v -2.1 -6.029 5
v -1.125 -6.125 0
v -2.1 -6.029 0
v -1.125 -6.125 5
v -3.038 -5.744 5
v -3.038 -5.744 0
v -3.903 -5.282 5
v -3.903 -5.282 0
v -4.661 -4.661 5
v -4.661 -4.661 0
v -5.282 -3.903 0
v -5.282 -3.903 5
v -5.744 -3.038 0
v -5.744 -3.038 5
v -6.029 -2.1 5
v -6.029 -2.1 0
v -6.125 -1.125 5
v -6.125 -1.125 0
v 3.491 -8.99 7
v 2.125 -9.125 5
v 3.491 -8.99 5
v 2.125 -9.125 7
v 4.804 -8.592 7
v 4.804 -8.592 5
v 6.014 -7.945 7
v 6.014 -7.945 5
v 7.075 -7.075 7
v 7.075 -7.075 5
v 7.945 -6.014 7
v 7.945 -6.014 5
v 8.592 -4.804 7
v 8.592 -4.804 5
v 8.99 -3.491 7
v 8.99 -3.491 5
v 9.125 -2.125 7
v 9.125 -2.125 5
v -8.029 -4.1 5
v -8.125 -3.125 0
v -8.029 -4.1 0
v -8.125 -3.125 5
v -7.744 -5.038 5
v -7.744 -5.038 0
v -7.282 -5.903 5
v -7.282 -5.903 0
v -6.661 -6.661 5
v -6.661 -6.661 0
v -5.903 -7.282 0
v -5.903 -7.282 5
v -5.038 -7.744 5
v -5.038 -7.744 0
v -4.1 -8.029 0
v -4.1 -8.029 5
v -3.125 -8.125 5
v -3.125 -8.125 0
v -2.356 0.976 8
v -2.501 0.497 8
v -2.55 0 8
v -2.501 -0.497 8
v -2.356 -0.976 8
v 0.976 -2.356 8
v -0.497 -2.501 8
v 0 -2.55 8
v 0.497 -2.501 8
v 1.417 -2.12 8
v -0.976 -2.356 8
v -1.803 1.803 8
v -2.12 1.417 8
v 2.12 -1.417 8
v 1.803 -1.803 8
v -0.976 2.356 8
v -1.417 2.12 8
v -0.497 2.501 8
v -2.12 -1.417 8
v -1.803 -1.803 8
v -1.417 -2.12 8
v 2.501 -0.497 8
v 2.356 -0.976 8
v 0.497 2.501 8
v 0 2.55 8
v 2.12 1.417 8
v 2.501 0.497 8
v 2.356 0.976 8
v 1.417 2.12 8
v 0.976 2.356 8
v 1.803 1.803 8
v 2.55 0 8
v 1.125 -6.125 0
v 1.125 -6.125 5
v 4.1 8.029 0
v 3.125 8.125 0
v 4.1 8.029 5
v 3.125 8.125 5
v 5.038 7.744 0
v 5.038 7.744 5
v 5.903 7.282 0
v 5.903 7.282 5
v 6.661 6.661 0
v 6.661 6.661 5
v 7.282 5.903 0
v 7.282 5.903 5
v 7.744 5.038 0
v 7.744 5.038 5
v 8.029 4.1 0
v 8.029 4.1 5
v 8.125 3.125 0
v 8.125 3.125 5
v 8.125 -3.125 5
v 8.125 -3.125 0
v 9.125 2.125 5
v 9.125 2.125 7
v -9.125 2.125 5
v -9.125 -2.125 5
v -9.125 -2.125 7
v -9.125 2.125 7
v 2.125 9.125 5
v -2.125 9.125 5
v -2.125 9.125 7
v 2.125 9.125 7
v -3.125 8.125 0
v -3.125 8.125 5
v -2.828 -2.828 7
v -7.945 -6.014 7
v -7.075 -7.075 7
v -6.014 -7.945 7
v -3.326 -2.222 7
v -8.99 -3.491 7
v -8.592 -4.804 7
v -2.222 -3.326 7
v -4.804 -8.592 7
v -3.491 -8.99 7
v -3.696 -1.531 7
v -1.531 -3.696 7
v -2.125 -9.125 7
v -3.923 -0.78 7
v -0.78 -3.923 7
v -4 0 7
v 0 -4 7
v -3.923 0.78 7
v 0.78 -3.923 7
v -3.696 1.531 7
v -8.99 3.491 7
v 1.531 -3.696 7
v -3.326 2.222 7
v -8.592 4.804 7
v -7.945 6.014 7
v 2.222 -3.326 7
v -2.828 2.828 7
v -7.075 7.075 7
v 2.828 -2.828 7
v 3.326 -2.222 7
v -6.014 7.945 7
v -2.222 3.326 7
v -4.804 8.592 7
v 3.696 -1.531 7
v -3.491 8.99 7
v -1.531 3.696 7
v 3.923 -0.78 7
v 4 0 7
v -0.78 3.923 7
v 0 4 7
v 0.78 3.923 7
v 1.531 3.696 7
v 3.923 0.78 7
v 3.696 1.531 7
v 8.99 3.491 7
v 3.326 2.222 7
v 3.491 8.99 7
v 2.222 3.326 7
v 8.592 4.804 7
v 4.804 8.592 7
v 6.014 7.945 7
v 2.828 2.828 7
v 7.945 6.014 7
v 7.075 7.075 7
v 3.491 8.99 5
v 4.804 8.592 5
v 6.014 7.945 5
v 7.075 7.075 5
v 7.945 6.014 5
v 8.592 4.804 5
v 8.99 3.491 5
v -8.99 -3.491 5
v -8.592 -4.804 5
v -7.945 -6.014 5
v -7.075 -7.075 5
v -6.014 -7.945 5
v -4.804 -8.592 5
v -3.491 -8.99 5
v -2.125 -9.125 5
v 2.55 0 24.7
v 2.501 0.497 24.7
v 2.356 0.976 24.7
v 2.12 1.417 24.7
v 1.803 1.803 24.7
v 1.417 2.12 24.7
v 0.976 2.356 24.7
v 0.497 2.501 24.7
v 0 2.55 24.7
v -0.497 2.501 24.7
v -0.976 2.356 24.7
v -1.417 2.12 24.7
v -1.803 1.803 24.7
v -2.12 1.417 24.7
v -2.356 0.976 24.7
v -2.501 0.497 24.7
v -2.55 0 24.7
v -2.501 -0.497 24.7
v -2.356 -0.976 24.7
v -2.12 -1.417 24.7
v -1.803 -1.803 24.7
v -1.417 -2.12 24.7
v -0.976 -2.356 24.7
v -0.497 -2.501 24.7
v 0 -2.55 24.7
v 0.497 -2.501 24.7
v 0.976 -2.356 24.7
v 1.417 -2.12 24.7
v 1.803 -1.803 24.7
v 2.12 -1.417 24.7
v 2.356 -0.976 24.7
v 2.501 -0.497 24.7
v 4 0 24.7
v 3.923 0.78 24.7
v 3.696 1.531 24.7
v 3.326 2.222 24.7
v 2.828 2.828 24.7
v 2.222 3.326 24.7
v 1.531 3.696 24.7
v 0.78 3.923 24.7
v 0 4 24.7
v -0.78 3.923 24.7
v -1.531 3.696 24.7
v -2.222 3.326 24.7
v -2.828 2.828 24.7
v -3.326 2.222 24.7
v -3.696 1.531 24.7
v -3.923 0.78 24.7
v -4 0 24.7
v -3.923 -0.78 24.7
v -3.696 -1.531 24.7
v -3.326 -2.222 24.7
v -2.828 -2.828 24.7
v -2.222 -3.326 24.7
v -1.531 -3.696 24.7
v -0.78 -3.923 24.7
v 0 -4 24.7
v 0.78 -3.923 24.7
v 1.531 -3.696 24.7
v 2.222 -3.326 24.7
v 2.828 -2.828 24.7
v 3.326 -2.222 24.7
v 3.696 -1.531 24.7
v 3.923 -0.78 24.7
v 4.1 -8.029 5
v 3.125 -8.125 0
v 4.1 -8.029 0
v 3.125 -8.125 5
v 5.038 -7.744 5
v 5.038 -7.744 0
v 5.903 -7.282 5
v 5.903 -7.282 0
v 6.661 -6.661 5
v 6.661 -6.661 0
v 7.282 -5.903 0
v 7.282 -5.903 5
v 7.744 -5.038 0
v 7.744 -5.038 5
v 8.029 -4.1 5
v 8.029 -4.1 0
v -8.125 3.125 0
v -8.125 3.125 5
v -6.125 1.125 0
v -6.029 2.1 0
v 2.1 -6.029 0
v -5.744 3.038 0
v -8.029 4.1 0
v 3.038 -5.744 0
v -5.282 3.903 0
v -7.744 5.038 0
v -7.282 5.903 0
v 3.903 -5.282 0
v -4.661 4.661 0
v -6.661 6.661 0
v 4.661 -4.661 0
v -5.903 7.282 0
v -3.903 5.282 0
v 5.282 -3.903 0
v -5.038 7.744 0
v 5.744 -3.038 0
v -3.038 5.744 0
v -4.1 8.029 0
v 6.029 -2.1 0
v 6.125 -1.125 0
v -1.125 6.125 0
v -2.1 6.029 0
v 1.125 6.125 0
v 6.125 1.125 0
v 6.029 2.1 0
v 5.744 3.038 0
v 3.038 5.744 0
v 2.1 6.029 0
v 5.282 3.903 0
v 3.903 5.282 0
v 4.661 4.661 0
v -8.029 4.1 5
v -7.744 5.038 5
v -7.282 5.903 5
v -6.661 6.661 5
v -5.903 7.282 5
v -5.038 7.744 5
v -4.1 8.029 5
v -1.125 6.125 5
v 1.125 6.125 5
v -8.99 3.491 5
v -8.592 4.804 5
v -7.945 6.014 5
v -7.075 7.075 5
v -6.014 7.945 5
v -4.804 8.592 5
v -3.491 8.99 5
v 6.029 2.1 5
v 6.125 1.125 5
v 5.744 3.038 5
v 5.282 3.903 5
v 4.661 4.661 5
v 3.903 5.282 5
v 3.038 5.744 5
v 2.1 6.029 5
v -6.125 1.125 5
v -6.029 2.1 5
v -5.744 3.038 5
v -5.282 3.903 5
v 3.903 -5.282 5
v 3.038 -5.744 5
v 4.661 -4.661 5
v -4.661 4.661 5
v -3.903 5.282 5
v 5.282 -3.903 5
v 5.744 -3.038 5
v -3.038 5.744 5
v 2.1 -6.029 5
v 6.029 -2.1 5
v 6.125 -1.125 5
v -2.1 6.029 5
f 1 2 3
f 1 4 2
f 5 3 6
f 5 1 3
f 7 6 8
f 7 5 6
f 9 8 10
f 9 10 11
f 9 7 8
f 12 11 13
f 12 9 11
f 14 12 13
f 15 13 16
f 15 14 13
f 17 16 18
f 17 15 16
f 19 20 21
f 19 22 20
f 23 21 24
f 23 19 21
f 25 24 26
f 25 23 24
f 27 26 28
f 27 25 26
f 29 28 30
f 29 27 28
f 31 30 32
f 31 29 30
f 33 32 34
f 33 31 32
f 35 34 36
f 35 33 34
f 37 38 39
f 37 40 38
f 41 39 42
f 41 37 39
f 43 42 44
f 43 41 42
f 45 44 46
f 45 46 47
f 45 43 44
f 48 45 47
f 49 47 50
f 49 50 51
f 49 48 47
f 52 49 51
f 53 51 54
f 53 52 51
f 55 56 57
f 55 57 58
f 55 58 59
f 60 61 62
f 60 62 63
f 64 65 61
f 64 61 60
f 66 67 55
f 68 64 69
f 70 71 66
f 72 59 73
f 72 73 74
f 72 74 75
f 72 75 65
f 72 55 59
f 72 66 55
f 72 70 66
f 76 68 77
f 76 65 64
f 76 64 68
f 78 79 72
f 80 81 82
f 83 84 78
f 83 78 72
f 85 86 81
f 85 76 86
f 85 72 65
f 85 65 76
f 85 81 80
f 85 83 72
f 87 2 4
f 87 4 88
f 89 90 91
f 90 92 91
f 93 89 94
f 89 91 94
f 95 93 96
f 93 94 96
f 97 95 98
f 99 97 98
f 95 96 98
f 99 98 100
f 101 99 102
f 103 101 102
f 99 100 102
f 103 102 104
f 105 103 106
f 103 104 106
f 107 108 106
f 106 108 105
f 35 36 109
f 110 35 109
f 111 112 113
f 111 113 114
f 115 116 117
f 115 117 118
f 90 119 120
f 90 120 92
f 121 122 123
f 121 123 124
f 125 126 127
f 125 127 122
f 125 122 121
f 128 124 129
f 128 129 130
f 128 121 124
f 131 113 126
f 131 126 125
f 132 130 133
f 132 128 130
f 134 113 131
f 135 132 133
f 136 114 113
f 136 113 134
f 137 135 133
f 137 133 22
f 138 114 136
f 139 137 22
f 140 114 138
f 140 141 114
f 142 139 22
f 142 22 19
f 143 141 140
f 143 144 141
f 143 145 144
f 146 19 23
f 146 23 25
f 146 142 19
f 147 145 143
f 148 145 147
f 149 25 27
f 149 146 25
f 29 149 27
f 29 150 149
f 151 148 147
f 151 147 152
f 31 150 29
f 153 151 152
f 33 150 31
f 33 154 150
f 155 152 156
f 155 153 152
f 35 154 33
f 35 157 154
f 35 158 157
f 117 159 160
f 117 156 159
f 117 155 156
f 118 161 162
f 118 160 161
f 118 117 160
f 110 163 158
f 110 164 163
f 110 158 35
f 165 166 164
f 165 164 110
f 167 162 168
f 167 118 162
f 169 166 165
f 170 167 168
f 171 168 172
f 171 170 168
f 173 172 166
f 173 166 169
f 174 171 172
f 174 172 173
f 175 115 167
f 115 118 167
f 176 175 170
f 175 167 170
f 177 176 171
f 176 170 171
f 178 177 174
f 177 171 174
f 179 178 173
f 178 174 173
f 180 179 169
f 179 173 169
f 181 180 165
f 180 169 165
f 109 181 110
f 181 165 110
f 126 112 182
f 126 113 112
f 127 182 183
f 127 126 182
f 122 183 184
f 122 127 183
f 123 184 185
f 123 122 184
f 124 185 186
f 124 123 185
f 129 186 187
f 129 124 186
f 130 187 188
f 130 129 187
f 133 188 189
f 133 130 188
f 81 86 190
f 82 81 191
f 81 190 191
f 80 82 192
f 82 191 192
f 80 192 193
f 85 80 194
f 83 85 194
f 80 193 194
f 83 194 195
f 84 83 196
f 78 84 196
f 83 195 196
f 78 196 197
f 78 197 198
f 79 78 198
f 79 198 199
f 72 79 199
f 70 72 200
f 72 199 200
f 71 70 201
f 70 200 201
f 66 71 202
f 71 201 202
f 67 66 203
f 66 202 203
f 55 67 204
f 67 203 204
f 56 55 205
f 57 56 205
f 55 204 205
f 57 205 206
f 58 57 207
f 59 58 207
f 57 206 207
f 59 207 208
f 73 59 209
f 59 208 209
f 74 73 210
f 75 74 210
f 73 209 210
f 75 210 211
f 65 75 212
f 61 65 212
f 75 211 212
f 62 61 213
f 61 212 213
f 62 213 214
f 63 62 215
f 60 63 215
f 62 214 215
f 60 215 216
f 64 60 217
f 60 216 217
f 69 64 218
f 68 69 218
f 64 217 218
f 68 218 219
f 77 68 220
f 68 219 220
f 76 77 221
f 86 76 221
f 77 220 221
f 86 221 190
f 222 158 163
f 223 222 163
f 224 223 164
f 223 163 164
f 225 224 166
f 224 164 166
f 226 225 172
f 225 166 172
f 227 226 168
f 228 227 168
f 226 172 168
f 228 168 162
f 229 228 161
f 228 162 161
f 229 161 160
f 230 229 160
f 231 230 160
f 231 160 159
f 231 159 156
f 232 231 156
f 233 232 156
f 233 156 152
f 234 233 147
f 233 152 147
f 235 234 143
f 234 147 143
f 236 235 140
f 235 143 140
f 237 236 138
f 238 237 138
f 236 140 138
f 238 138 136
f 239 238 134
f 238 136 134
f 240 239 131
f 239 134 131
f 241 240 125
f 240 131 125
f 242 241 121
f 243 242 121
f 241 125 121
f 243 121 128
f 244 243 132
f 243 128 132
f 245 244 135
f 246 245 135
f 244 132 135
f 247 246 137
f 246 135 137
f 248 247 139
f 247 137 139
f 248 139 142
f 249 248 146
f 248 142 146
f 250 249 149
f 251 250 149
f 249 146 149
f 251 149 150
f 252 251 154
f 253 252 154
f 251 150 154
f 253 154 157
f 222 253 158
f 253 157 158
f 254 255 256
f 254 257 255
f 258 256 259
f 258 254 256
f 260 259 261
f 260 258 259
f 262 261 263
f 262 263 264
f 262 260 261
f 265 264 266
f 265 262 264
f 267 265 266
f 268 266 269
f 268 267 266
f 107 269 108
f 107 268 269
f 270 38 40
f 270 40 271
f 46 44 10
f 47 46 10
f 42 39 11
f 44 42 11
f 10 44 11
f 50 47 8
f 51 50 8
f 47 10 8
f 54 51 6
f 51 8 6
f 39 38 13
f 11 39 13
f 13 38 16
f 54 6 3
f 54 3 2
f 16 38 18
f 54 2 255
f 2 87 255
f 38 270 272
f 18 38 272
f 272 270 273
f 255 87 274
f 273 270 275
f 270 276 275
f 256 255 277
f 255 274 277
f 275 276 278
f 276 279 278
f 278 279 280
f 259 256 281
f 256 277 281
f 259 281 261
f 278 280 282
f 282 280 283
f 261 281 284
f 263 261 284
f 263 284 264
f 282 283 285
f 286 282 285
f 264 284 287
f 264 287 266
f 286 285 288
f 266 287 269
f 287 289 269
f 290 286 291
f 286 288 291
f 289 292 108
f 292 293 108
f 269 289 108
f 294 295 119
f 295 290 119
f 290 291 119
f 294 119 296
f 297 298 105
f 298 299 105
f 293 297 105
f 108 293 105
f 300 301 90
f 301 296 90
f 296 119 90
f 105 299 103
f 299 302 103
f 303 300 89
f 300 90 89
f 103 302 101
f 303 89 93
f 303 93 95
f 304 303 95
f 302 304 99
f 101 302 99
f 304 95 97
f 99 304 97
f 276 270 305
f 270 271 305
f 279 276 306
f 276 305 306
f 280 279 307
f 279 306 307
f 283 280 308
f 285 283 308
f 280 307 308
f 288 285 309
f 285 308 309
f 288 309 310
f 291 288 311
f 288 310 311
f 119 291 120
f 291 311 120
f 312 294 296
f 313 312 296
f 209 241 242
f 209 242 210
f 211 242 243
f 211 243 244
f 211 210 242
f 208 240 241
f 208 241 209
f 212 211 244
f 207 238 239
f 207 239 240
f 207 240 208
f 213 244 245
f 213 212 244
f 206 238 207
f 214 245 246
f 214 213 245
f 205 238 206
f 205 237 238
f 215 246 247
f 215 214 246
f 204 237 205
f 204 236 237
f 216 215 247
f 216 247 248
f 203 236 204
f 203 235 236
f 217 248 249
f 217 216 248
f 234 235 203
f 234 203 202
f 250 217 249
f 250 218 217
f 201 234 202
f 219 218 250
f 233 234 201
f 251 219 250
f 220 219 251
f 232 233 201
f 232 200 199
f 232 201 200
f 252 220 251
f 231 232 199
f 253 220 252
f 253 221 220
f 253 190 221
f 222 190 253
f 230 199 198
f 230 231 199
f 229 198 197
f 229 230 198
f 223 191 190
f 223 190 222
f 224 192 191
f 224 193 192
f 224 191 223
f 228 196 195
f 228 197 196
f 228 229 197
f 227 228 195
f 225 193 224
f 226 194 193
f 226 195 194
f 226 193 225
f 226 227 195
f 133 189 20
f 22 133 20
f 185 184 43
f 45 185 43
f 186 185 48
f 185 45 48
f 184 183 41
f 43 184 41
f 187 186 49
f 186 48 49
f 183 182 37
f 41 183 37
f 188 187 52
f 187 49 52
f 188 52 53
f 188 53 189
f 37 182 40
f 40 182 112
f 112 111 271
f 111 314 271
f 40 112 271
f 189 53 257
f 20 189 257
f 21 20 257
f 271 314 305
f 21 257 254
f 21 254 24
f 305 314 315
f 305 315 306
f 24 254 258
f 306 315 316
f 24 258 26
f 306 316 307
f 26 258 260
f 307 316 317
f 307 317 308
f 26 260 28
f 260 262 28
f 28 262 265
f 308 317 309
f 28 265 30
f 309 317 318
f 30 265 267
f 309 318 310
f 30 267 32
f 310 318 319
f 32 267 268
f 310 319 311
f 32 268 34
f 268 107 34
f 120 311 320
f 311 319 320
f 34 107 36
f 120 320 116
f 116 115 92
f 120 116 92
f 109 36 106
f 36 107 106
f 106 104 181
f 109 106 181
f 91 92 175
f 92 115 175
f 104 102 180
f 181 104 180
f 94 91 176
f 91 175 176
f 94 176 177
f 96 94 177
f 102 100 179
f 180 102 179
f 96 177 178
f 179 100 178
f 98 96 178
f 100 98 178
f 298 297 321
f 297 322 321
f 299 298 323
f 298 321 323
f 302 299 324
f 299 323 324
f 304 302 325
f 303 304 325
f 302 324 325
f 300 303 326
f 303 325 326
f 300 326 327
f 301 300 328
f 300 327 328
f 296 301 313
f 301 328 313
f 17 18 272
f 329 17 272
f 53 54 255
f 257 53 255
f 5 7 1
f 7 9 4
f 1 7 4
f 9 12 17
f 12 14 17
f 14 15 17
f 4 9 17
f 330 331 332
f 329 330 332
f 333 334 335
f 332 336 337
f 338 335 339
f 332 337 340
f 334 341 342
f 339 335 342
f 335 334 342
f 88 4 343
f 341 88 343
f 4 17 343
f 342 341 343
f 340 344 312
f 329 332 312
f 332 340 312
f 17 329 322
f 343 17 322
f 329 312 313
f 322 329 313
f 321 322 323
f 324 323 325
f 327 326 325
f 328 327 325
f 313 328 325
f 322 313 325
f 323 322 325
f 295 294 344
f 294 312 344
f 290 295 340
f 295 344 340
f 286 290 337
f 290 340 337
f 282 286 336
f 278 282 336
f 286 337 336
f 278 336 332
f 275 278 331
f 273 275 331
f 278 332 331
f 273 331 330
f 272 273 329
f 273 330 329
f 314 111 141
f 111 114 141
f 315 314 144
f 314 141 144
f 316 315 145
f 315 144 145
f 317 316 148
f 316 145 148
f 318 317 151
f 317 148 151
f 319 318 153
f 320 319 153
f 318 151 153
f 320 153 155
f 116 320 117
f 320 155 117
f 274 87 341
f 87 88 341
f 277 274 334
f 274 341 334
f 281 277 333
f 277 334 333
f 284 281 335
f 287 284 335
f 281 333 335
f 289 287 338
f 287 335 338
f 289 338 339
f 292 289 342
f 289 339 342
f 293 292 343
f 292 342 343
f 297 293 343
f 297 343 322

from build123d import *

# Parameters (mm, degrees)
SKETCH1_W           = 16.25
SKETCH1_H           = 16.25
SKETCH1_W_2         = 12.25
SKETCH1_H_2         = 12.25
BOSS_EXTRUDE1_DEPTH = 5
FILLET1_R           = 5
SKETCH2_W           = 18.25
SKETCH2_H           = 18.25
BOSS_EXTRUDE2_DEPTH = 2
FILLET2_R           = 7
SKETCH4_R           = 4
BOSS_EXTRUDE3_DEPTH = 17.7
SKETCH6_R           = 2.55
CUT_EXTRUDE1_DEPTH  = 16.7


with BuildPart() as part:
    # Sketch1 → Boss-Extrude1 (new body)
    with BuildSketch(Plane.XY):
        Rectangle(SKETCH1_W, SKETCH1_H)
        Rectangle(SKETCH1_W_2, SKETCH1_H_2, mode=Mode.SUBTRACT)
    extrude(amount=BOSS_EXTRUDE1_DEPTH)

    # Fillet1
    fillet1_edges = [part.edges().sort_by_distance(p)[0] for p in [
        (6.125, -6.125, 2.5),
        (6.125, 6.125, 2.5),
        (-6.125, 6.125, 2.5),
        (-6.125, -6.125, 2.5),
        (-8.125, 8.125, 2.5),
        (8.125, 8.125, 2.5),
        (8.125, -8.125, 2.5),
        (-8.125, -8.125, 2.5),
    ]]
    fillet(fillet1_edges, radius=FILLET1_R)

    # Sketch2 → Boss-Extrude2 (add)
    with BuildSketch(Plane.XY.offset(5)):
        Rectangle(SKETCH2_W, SKETCH2_H)
    extrude(amount=BOSS_EXTRUDE2_DEPTH)

    # Fillet2
    fillet2_edges = [part.edges().sort_by_distance(p)[0] for p in [
        (-9.125, 9.125, 6),
        (-9.125, -9.125, 6),
        (9.125, -9.125, 6),
        (9.125, 9.125, 6),
    ]]
    fillet(fillet2_edges, radius=FILLET2_R)

    # Sketch4 → Boss-Extrude3 (add)
    with BuildSketch(Plane.XY.offset(7)):
        Circle(SKETCH4_R)
    extrude(amount=BOSS_EXTRUDE3_DEPTH)

    # Sketch6 → Cut-Extrude1 (cut)
    with BuildSketch(Plane.XY.offset(24.7)):
        Circle(SKETCH6_R)
    extrude(amount=-CUT_EXTRUDE1_DEPTH, mode=Mode.SUBTRACT)


solid = part.part
